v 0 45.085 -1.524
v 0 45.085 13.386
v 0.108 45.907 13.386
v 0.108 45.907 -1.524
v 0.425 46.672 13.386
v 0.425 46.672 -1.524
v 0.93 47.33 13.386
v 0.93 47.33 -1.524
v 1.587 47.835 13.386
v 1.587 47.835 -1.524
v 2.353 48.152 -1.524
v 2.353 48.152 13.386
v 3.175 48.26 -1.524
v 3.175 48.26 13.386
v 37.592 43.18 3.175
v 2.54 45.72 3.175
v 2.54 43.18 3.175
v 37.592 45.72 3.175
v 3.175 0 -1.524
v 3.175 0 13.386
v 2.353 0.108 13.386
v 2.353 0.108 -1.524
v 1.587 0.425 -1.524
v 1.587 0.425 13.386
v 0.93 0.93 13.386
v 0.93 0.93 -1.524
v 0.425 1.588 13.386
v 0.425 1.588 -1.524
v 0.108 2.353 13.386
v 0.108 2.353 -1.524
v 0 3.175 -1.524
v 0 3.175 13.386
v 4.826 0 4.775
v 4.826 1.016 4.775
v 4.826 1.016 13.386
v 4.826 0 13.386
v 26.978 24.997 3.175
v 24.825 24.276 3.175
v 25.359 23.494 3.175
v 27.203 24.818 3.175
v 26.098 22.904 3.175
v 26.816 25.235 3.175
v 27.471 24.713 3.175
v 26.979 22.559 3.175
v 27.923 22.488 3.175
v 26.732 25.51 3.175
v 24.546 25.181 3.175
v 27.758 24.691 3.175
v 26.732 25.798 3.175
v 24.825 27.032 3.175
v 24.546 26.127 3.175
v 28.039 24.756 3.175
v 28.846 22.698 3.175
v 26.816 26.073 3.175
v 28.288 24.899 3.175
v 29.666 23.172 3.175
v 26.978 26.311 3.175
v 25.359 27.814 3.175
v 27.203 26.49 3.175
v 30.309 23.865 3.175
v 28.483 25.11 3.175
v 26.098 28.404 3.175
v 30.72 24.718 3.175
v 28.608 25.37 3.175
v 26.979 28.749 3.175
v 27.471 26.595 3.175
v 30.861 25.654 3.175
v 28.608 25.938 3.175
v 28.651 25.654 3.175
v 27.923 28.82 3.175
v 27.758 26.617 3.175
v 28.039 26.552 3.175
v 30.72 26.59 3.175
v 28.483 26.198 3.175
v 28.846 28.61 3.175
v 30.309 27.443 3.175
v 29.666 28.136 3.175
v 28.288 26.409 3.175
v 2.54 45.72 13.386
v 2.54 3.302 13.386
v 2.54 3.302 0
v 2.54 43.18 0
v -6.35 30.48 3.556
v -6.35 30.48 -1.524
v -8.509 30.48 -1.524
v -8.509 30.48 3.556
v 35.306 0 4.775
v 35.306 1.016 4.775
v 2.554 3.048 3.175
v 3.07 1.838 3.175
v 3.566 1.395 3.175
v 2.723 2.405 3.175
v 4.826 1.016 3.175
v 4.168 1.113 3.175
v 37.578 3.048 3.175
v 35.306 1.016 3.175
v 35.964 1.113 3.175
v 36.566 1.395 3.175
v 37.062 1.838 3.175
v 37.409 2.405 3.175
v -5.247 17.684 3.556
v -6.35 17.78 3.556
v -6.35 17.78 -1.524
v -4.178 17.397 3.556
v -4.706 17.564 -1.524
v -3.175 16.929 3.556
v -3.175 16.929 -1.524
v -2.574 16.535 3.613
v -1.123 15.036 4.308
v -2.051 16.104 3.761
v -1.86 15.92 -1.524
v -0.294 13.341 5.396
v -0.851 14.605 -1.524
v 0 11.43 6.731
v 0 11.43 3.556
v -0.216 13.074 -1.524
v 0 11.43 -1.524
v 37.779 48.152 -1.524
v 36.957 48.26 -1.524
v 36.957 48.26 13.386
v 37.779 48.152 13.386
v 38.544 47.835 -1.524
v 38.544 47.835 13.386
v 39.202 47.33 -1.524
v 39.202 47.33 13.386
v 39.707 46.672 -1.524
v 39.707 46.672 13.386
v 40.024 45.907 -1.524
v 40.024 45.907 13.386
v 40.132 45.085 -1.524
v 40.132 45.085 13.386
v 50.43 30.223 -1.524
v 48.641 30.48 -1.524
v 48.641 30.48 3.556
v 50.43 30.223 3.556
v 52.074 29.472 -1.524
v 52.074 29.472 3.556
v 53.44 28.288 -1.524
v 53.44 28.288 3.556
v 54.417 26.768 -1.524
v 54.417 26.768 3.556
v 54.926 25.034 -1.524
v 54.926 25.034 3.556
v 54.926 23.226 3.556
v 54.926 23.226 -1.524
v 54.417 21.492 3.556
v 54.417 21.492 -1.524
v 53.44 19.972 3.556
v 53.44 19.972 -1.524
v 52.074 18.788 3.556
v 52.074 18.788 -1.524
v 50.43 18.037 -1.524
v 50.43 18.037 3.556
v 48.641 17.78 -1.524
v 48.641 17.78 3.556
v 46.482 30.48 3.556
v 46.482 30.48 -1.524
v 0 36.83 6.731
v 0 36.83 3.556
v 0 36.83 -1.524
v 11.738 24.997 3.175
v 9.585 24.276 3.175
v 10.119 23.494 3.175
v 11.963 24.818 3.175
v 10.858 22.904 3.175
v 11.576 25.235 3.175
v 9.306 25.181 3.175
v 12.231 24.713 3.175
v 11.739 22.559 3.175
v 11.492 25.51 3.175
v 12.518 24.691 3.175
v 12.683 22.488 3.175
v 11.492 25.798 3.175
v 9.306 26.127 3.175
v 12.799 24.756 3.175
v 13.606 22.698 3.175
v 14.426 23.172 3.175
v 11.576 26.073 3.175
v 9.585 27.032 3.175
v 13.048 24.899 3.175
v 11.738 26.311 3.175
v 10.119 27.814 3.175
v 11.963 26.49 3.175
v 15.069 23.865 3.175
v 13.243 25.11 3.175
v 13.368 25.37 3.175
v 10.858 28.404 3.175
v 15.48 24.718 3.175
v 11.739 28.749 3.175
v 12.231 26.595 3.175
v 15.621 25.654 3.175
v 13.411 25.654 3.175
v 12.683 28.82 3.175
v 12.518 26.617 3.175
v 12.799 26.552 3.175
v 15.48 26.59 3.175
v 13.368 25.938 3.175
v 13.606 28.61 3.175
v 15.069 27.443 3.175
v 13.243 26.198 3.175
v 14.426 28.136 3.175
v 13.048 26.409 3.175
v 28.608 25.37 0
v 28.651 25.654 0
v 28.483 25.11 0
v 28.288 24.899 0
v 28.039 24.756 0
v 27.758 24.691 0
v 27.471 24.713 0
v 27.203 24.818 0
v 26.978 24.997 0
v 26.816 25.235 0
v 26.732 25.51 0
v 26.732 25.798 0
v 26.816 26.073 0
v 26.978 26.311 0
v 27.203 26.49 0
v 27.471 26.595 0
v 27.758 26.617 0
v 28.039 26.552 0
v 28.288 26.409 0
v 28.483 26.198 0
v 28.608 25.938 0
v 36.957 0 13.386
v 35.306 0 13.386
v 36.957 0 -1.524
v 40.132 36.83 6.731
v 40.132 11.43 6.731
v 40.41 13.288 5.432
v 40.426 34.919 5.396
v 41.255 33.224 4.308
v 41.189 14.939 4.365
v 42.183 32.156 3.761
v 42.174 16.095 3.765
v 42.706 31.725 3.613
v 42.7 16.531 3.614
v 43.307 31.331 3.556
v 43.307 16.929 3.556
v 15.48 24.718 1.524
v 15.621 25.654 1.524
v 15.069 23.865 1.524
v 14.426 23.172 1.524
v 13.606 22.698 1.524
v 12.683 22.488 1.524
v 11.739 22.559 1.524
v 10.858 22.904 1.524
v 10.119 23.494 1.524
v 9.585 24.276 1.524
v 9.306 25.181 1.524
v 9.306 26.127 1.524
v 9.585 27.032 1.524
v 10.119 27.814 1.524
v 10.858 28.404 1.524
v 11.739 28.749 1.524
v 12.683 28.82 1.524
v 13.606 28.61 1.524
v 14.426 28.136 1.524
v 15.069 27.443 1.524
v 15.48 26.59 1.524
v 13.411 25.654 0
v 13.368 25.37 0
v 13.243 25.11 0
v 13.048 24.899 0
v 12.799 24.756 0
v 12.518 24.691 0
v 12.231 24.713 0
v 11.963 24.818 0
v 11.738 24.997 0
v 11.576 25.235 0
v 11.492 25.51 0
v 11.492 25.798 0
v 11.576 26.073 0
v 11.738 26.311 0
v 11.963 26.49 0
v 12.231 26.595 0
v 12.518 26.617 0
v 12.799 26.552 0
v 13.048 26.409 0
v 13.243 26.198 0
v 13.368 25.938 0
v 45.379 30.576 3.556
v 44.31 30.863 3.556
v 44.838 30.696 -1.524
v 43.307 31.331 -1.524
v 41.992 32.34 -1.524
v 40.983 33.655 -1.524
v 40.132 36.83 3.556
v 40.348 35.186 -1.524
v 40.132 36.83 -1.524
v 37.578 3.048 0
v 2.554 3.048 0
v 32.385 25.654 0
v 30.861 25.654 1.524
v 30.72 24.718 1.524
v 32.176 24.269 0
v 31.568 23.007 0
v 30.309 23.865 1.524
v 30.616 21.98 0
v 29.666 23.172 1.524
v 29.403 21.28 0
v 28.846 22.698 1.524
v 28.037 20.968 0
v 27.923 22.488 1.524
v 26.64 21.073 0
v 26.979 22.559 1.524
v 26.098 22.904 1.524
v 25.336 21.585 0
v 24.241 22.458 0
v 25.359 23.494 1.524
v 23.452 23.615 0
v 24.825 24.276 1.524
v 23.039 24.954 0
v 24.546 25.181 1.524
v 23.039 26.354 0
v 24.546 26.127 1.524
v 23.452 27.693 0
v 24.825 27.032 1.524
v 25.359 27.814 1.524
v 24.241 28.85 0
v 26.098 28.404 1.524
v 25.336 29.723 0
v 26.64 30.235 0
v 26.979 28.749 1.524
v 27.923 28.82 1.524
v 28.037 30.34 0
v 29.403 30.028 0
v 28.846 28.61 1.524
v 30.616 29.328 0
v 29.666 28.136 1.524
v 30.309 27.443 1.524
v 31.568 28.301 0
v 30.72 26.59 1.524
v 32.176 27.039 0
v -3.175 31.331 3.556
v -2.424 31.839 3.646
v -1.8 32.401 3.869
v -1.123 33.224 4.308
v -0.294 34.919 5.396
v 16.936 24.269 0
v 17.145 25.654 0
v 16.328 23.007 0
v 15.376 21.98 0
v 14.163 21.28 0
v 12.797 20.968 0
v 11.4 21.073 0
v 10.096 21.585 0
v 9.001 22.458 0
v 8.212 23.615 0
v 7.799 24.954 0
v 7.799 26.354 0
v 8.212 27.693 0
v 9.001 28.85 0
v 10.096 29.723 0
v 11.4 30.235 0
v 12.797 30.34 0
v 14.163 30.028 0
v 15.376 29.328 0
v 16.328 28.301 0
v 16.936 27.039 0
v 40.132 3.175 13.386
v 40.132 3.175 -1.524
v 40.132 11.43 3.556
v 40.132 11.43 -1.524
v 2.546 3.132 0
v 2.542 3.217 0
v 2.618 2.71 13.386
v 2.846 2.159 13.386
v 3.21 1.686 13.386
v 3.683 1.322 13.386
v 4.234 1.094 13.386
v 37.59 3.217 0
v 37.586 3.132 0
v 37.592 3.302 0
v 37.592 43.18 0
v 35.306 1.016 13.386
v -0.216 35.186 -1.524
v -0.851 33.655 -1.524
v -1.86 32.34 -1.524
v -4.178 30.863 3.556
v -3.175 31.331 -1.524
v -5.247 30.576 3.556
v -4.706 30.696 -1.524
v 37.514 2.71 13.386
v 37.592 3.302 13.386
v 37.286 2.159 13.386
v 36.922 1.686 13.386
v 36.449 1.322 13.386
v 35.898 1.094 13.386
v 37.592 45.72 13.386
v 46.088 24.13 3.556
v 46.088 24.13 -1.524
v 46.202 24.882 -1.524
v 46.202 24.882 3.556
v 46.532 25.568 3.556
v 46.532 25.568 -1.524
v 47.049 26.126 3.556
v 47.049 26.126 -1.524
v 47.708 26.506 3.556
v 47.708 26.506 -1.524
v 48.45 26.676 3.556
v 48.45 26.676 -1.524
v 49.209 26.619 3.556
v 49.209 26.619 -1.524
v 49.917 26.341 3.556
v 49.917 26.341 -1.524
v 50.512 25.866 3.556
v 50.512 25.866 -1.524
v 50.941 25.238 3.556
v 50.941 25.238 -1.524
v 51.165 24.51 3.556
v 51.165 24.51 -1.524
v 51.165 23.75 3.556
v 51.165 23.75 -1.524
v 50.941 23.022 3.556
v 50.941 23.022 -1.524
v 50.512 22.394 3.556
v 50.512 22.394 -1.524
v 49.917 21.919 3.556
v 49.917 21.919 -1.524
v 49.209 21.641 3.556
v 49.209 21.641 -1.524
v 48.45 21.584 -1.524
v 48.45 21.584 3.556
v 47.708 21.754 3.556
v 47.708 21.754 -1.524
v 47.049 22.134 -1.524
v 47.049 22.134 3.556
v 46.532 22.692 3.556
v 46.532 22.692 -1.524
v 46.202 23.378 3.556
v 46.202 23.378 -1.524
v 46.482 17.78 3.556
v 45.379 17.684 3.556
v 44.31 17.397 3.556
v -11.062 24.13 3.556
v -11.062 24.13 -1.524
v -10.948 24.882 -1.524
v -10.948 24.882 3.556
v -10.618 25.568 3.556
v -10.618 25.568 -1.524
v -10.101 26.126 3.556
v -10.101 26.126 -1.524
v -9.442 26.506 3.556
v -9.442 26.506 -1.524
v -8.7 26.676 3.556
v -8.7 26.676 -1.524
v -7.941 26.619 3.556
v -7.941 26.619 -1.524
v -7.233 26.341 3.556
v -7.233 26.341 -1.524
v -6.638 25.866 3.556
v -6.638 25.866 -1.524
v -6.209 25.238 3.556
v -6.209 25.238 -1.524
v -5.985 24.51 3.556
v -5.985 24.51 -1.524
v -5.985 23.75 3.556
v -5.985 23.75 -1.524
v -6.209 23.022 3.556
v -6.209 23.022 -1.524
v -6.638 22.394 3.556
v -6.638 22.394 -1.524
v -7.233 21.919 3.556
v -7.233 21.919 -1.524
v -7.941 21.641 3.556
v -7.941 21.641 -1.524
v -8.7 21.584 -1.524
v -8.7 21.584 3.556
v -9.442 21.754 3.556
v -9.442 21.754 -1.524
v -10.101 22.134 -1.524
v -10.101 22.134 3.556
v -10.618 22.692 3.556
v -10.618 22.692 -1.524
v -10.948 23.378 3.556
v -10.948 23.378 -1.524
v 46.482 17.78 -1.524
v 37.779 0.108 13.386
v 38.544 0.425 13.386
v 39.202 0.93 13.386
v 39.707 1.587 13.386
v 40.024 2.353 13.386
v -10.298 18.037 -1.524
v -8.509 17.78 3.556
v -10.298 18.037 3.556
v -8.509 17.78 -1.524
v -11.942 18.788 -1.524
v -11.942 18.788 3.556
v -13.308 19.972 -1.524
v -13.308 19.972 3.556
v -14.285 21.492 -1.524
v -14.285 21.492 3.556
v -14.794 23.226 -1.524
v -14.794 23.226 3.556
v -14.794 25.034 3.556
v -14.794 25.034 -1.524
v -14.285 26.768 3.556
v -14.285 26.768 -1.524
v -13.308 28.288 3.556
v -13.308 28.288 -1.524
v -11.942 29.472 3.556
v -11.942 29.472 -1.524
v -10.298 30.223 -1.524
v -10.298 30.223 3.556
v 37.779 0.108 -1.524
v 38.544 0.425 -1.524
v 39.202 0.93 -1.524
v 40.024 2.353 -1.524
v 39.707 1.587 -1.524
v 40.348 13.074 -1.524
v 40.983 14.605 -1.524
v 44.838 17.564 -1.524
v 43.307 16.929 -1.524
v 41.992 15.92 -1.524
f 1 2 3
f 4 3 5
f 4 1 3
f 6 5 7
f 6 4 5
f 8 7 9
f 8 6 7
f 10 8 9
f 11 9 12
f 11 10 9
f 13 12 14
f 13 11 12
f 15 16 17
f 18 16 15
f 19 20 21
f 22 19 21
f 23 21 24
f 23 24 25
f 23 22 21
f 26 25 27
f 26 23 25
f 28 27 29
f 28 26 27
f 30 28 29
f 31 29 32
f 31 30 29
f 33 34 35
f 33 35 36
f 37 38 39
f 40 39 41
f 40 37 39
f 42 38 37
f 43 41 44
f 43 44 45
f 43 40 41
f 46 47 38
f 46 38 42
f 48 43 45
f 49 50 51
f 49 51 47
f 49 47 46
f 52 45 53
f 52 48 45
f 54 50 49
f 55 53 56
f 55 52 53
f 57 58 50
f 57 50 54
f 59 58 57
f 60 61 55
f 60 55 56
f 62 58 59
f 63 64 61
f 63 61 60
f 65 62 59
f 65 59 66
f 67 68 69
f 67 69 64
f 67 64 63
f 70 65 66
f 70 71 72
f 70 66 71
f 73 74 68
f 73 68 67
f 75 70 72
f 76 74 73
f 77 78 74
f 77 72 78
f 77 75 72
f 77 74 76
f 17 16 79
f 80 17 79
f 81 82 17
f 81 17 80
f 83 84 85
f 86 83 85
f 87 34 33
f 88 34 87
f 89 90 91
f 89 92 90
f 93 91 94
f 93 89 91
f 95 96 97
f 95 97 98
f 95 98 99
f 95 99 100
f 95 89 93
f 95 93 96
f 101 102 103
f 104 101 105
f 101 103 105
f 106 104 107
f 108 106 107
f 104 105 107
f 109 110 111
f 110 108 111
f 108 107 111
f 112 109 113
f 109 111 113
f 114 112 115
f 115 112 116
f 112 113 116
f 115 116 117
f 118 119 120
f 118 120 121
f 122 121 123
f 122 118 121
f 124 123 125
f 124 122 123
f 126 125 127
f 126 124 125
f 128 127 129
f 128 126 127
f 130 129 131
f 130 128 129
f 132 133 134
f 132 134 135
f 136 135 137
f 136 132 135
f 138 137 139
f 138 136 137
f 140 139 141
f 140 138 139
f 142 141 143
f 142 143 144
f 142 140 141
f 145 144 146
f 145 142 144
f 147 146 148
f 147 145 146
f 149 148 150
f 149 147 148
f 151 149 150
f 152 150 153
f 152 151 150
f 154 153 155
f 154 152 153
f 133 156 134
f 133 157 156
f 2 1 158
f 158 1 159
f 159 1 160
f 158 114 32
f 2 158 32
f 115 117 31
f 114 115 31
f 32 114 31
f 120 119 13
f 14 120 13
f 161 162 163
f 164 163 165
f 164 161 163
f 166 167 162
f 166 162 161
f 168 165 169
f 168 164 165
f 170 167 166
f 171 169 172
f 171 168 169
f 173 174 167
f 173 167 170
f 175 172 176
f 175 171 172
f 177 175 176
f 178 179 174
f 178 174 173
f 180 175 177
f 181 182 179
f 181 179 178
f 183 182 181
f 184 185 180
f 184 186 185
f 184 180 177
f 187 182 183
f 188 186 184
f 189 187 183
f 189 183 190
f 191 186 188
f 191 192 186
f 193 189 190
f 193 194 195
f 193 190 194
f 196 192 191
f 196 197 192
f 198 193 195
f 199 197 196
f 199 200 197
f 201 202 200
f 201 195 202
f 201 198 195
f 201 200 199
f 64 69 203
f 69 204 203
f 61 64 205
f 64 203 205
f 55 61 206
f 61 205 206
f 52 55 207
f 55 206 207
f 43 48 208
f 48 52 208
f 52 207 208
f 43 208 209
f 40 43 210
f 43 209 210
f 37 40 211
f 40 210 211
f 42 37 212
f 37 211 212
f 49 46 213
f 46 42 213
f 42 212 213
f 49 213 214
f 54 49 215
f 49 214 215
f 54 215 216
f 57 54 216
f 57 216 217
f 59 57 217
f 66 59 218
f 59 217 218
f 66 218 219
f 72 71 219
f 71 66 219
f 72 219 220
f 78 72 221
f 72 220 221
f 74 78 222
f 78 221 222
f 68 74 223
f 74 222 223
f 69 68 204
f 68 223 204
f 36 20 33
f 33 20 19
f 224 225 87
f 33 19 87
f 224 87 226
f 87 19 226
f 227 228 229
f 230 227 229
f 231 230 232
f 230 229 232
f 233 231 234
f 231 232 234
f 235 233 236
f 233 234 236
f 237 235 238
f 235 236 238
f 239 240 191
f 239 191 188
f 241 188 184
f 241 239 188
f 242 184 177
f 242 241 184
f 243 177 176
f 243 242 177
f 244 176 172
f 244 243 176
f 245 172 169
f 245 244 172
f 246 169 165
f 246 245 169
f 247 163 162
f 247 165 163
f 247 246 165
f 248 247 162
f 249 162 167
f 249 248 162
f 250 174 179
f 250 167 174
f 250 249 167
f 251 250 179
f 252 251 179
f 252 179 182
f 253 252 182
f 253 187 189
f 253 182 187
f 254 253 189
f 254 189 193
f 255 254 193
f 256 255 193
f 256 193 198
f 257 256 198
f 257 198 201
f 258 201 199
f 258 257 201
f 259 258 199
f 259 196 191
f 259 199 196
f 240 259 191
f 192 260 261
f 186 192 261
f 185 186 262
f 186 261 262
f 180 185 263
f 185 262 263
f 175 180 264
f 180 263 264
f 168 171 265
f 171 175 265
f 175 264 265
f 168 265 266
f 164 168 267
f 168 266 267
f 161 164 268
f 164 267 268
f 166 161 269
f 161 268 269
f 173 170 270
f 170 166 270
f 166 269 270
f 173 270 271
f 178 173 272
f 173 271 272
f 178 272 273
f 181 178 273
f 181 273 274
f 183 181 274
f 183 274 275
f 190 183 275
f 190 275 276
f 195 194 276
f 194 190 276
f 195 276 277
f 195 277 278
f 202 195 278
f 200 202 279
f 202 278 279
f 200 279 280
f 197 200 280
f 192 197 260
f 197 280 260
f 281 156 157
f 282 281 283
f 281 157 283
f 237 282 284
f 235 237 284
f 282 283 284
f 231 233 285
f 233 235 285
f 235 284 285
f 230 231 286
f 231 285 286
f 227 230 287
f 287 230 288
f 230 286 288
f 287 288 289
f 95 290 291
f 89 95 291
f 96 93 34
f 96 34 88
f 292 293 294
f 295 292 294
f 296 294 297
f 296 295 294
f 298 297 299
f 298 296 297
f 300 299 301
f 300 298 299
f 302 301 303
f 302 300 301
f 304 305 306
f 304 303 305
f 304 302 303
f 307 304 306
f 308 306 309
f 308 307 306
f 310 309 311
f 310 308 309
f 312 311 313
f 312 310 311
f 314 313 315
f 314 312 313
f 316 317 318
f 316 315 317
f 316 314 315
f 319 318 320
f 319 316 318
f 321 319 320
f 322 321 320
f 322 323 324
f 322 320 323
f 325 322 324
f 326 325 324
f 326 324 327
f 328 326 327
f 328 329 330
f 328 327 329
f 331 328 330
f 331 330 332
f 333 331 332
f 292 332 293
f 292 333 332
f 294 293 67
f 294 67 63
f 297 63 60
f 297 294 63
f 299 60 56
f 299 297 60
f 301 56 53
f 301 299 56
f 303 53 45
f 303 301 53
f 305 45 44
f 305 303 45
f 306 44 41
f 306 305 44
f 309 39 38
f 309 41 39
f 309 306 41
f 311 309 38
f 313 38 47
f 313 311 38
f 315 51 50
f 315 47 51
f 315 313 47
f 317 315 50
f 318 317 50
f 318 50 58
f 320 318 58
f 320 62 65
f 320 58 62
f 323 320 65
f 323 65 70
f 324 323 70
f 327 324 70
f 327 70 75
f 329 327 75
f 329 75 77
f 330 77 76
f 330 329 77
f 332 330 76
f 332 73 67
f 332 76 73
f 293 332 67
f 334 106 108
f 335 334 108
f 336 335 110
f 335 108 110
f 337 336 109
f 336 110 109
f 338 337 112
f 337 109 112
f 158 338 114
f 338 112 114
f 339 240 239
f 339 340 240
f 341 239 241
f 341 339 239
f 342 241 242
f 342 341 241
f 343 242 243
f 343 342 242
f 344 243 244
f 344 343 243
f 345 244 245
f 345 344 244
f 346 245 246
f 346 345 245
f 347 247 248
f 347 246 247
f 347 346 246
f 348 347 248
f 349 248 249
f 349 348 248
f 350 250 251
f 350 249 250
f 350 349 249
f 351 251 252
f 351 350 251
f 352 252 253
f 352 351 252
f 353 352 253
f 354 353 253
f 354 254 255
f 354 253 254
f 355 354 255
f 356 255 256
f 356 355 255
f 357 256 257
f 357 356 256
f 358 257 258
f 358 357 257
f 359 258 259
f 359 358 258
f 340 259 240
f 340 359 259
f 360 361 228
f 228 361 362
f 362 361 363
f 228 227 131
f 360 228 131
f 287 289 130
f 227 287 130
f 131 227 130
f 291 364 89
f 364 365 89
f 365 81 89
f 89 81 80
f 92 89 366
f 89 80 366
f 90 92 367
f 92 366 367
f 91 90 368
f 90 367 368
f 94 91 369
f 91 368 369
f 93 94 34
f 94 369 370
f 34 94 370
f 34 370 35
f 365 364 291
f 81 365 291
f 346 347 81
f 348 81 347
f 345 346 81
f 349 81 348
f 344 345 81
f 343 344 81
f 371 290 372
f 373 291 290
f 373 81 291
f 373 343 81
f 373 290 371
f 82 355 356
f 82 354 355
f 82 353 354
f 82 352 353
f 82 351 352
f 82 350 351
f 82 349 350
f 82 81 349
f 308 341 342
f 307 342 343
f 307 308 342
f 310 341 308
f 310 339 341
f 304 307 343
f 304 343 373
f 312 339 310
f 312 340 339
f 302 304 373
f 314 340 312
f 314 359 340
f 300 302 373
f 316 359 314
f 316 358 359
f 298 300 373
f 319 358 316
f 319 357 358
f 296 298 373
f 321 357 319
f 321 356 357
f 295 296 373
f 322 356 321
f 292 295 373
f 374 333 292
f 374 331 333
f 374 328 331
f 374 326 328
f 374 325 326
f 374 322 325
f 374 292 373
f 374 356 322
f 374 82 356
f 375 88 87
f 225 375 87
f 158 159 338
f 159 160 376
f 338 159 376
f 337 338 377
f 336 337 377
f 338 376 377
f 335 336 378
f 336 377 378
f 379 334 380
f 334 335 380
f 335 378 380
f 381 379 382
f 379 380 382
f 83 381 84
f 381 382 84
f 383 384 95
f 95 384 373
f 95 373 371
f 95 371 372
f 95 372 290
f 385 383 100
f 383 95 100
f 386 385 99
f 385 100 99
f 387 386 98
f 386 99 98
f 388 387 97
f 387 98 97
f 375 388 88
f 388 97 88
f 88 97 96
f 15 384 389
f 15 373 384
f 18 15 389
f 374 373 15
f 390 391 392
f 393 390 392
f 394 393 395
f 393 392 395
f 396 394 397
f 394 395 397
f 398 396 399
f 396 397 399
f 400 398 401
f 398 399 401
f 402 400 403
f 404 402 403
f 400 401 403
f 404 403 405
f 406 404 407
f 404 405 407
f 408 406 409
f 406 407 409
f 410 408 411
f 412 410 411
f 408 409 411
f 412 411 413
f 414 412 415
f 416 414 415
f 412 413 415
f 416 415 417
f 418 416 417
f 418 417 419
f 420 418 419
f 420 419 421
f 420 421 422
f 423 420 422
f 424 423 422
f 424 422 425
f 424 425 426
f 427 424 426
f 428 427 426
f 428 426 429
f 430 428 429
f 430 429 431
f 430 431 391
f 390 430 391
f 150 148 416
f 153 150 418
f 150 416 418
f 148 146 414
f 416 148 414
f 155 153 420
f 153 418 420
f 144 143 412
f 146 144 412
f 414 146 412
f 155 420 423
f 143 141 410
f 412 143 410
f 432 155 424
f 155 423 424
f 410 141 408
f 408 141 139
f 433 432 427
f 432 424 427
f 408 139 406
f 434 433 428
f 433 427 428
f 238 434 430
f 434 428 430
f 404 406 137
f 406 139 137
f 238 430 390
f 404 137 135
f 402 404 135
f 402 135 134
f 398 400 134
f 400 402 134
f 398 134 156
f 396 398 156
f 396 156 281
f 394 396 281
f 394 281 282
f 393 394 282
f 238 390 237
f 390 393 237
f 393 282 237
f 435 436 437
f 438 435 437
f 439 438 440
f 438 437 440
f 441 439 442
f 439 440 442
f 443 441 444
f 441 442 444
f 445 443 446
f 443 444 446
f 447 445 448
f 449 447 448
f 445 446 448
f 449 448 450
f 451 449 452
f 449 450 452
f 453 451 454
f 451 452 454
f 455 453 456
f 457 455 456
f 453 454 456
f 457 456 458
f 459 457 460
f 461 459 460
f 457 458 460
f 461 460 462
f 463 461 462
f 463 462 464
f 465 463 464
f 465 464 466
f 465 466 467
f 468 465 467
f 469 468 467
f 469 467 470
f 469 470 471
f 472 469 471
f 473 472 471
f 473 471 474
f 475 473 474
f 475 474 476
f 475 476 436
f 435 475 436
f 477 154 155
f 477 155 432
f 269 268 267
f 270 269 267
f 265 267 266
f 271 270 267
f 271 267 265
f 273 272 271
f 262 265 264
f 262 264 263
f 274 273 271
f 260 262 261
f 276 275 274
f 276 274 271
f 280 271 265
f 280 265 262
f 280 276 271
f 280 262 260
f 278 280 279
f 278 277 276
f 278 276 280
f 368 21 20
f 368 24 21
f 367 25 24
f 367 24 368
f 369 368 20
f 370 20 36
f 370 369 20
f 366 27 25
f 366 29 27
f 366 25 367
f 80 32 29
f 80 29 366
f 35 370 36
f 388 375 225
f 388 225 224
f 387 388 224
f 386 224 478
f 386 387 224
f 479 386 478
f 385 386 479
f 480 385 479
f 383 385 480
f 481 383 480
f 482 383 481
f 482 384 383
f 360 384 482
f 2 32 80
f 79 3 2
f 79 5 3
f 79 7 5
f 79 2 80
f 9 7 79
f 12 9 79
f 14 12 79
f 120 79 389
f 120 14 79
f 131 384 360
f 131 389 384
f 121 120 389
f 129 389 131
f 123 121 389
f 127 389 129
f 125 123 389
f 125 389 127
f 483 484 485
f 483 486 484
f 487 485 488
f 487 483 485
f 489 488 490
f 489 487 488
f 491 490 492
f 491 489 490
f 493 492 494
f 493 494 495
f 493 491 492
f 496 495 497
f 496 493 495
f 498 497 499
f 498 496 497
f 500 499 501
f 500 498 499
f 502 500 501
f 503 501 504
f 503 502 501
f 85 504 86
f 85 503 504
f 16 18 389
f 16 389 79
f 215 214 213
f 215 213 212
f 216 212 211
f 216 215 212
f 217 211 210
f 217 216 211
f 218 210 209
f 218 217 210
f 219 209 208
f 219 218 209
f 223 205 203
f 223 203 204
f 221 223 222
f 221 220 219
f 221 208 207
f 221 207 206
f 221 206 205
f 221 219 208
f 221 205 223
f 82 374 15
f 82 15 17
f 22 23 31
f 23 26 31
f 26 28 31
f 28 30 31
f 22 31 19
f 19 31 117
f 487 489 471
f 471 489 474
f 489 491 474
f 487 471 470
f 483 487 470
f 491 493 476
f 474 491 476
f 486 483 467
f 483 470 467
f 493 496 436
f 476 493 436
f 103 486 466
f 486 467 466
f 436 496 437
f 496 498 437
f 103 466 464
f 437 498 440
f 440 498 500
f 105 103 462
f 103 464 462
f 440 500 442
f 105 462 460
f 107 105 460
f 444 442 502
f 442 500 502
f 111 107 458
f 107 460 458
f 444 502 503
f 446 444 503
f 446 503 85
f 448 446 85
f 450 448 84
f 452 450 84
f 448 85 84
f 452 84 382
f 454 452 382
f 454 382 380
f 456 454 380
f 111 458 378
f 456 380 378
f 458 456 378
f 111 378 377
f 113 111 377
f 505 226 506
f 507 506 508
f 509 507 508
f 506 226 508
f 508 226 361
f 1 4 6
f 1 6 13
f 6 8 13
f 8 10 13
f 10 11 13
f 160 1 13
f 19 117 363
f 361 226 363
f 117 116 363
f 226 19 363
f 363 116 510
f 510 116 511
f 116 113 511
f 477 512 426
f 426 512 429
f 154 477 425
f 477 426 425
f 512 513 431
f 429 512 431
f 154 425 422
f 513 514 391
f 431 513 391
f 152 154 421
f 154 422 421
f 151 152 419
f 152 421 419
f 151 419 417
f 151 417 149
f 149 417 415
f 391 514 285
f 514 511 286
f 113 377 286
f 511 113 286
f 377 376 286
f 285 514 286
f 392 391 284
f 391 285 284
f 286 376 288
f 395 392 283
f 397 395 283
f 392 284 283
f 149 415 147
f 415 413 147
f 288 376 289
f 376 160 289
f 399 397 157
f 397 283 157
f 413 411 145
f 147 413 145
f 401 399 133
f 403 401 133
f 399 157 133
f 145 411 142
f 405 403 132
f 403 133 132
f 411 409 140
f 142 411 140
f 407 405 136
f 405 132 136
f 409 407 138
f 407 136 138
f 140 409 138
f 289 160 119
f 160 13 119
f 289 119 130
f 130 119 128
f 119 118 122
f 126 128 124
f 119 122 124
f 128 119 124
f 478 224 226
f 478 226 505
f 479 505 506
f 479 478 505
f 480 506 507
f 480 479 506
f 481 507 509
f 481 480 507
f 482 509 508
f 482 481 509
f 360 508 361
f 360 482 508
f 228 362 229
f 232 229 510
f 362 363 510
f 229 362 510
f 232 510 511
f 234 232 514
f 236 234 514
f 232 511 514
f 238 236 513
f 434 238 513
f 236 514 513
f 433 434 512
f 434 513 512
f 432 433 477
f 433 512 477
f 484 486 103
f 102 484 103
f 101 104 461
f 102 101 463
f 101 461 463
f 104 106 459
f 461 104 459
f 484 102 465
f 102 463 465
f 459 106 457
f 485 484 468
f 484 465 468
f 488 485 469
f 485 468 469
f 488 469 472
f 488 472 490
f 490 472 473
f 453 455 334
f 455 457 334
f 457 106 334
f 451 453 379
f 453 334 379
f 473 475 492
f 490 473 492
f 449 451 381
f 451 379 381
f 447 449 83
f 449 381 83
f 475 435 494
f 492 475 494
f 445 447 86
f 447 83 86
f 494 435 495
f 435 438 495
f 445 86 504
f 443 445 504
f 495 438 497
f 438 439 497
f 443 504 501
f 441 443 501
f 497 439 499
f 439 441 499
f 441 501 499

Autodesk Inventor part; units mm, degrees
ref_plane "YZ Plane" through (0, 0, 0) normal (1, 0, 0) x (0, 1, 0)
ref_plane "XZ Plane" through (0, 0, 0) normal (0, 1, 0) x (-1, 0, 0)
ref_plane "XY Plane" through (0, 0, 0) normal (0, 0, 1) x (1, 0, 0)
sketch "Sketch1" plane through (0, 0, 0) normal (0, 0, 1) x (1, 0, 0)
  line L0 (0, 0) -> (40.132, 0)
  line L1 (40.132, 0) -> (40.132, 48.26)
  line L2 (40.132, 48.26) -> (0, 48.26)
  line L3 (0, 48.26) -> (0, 0)
  line L4 (3.556, 44.704) -> (36.576, 44.704) construction
  line L5 (36.576, 44.704) -> (36.576, 1.524) construction
  line L6 (36.576, 1.524) -> (3.556, 1.524) construction
  line L7 (3.556, 1.524) -> (3.556, 44.704) construction
  line L8 (37.592, 1.016) -> (37.592, 45.72)
  line L9 (37.592, 45.72) -> (2.54, 45.72)
  line L10 (2.54, 45.72) -> (2.54, 1.016)
  line L11 (2.54, 1.016) -> (37.592, 1.016) construction
  line L12 (2.54, 1.016) -> (2.54, 0)
  line L13 (37.592, 1.016) -> (37.592, 0)
  line L14 (12.446, 25.654) -> (27.686, 25.654)
  point P0 (20.066, 48.26)
  point P1 (20.066, 44.704)
  point P2 (3.556, 23.114)
  point P3 (0, 24.13)
  point P4 (20.066, 25.654)
  dimension "d2" = 33.02
  dimension "d3" = 43.18
  dimension "d4" = 1.524
  dimension "d8" = 2.54
  dimension "d9" = 1.016
  dimension "d14" = 15.24
  dimension "d15" = 19.05
  dimension "d34" = 1.016
  dimension "d35" = 1.016
extrude "Extrusion1" add sketch "Sketch1" against normal blind 1.524
sketch "Sketch2" plane through (0, 0, 0) normal (0, 0, 1) x (1, 0, 0)
  line L0 (2.54, 1.016) -> (2.54, 0) projected
  line L1 (0, 48.26) -> (0, 0) projected
  line L2 (2.54, 45.72) -> (2.54, 1.016) projected
  line L3 (37.592, 45.72) -> (2.54, 45.72) projected
  line L4 (40.132, 48.26) -> (0, 48.26) projected
  line L5 (40.132, 0) -> (40.132, 48.26) projected
  line L6 (37.592, 1.016) -> (37.592, 0) projected
  line L7 (37.592, 1.016) -> (37.592, 45.72) projected
  line L8 (0, 0) -> (2.54, 0)
  line L9 (37.592, 0) -> (40.132, 0)
extrude "Extrusion2" add sketch "Sketch2" along normal blind 13.3856
sketch "Sketch3" plane through (0, 0, 0) normal (0, 0, 1) x (1, 0, 0)
  line L0 (2.54, 1.016) -> (37.592, 1.016) projected
  line L1 (2.54, 0) -> (37.592, 0) projected
  line L2 (2.54, 0) -> (2.54, 45.72) projected
  line L3 (37.592, 45.72) -> (37.592, 0) projected
  point P0 (0, 0)
extrude "Extrusion3" add sketch "Sketch3" along normal blind 4.775
sketch "Sketch4" plane through (0, 0, 0) normal (0, 0, 1) x (1, 0, 0)
  circle A0 centre (12.446, 25.654) radius 3.175
  circle A1 centre (27.686, 25.654) radius 3.175
  circle A2 centre (12.446, 25.654) radius 0.9652
  circle A3 centre (27.686, 25.654) radius 0.9652
  point P0 (0, 0)
  dimension "d16" = 6.35
  dimension "d18" = 1.9304
extrude "Extrusion4" add sketch "Sketch4" along normal blind 3.175
sketch "Sketch5" plane through (0, 0, 0) normal (0, 0, 1) x (1, 0, 0)
  circle A0 centre (12.446, 25.654) radius 3.175 construction
  circle A1 centre (27.686, 25.654) radius 3.175 construction
  line L0 (2.54, 1.016) -> (37.592, 1.016) construction
  line L1 (37.592, 1.016) -> (37.592, 45.72) construction
  line L2 (37.592, 45.72) -> (2.54, 45.72) construction
  line L3 (2.54, 45.72) -> (2.54, 1.016) construction
  line L4 (3.556, 44.704) -> (36.576, 44.704) construction
  line L5 (3.556, 1.524) -> (3.556, 44.704) construction
  line L6 (36.576, 44.704) -> (36.576, 1.524) construction
  line L7 (36.576, 1.524) -> (3.556, 1.524) construction
  line L8 (2.54, 1.016) -> (37.592, 1.016)
  line L9 (37.592, 1.016) -> (37.592, 3.048)
  line L10 (37.592, 3.048) -> (2.54, 3.048)
  line L11 (2.54, 3.048) -> (2.54, 1.016)
  line L12 (2.54, 45.72) -> (37.592, 45.72)
  line L13 (37.592, 45.72) -> (37.592, 43.18)
  line L14 (37.592, 43.18) -> (2.54, 43.18)
  line L15 (2.54, 43.18) -> (2.54, 45.72)
  point P0 (0, 0)
  dimension "d21" = 1.524
  dimension "d25" = 1.524
extrude "Extrusion5" add sketch "Sketch5" along normal blind 3.175
sketch "Sketch6" plane through (0, 0, 4.775) normal (0, 0, 1) x (1, 0, 0)
  line L0 (40.132, 0) -> (0, 0) construction
  line L1 (4.826, 0) -> (2.54, 0)
  line L2 (2.54, 0) -> (2.54, 1.016)
  line L3 (2.54, 1.016) -> (4.826, 1.016)
  line L4 (4.826, 1.016) -> (4.826, 0)
  line L5 (2.54, 0) -> (2.54, 45.72) projected
  line L6 (37.592, 1.016) -> (2.54, 1.016) construction
  line L7 (35.306, 0) -> (37.592, 0)
  line L8 (37.592, 0) -> (37.592, 1.016)
  line L9 (37.592, 1.016) -> (35.306, 1.016)
  line L10 (35.306, 1.016) -> (35.306, 0)
  dimension "d26" = 2.286
  dimension "d27" = 2.286
extrude "Extrusion6" add sketch "Sketch6" along normal up to surface (8.6106 mm away)
fillet "Fillet1" radius 2.286 2 edges at (37.592, 1.016, 8.2803) (2.54, 1.016, 8.2803)
chamfer "Chamfer2" distance 1.524 angle 45 2 edges at (9.271, 25.654, 0) (24.511, 25.654, 0)
fillet "Fillet2" radius 3.175 4 edges at (0, 0, 5.9308) (40.132, 0, 5.9308) (40.132, 48.26, 5.9308) (0, 48.26, 5.9308)
sketch "Sketch7" plane through (0, 0, -1.524) normal (0, 0, -1) x (-1, 0, 0)
  circle A0 centre (8.509, 24.13) radius 2.5527
  arc A1 (0, 45.085) -> (-3.175, 48.26) centre (-3.175, 45.085) ccw construction
  line L0 (-3.175, 48.26) -> (-36.957, 48.26) construction
  arc A2 (-36.957, 48.26) -> (-40.132, 45.085) centre (-36.957, 45.085) ccw construction
  line L1 (-40.132, 45.085) -> (-40.132, 3.175) construction
  arc A3 (-40.132, 3.175) -> (-36.957, 0) centre (-36.957, 3.175) ccw construction
  line L2 (-36.957, 0) -> (-3.175, 0) construction
  arc A4 (-3.175, 0) -> (0, 3.175) centre (-3.175, 3.175) ccw construction
  line L3 (0, 3.175) -> (0, 45.085) construction
  line L4 (-36.957, 48.26) -> (-3.175, 48.26) construction
  line L5 (-20.066, 48.26) -> (-20.066, 0) construction
  arc A5 (0, 36.83) -> (6.35, 30.48) centre (6.35, 36.83) ccw
  arc A6 (6.35, 17.78) -> (0, 11.43) centre (6.35, 11.43) ccw
  line L6 (6.35, 30.48) -> (8.509, 30.48)
  arc A7 (8.509, 17.78) -> (8.509, 30.48) centre (8.509, 24.13) ccw
  line L7 (8.509, 17.78) -> (6.35, 17.78)
  line L8 (0, 36.83) -> (0, 11.43)
  line L9 (0, 3.175) -> (0, 45.085) projected
  circle A8 centre (-48.641, 24.13) radius 2.5527
  arc A9 (-46.482, 30.48) -> (-40.132, 36.83) centre (-46.482, 36.83) ccw
  arc A10 (-40.132, 11.43) -> (-46.482, 17.78) centre (-46.482, 11.43) ccw
  line L10 (-46.482, 30.48) -> (-48.641, 30.48)
  arc A11 (-48.641, 30.48) -> (-48.641, 17.78) centre (-48.641, 24.13) ccw
  line L11 (-48.641, 17.78) -> (-46.482, 17.78)
  line L12 (-40.132, 36.83) -> (-40.132, 11.43)
  point P0 (0, 0)
  point P1 (0, 24.13)
  point P2 (-40.132, 24.13)
  dimension "d40" = 5.1054
  dimension "d41" = 6.35
  dimension "d43" = 6.35
  dimension "d44" = 57.15
extrude "Extrusion7" add sketch "Sketch7" against normal blind 5.08
fillet "Fillet3" radius 3.175 2 edges at (40.132, 24.13, 3.556) (0, 24.13, 3.556)
equation "\"d12\" = BoardOffset + PCBThickness"
equation "\"d19\" = BoardOffset"
equation "\"d23\" = BoardOffset"
equation "\"d27\" = d26"
equation "\"d28\" = BoardOffset"
equation "\"PCBThickness\" = 1.6"
equation "\"BoardOffset\" = 3.175"
properties part number "TOF Case P1"
